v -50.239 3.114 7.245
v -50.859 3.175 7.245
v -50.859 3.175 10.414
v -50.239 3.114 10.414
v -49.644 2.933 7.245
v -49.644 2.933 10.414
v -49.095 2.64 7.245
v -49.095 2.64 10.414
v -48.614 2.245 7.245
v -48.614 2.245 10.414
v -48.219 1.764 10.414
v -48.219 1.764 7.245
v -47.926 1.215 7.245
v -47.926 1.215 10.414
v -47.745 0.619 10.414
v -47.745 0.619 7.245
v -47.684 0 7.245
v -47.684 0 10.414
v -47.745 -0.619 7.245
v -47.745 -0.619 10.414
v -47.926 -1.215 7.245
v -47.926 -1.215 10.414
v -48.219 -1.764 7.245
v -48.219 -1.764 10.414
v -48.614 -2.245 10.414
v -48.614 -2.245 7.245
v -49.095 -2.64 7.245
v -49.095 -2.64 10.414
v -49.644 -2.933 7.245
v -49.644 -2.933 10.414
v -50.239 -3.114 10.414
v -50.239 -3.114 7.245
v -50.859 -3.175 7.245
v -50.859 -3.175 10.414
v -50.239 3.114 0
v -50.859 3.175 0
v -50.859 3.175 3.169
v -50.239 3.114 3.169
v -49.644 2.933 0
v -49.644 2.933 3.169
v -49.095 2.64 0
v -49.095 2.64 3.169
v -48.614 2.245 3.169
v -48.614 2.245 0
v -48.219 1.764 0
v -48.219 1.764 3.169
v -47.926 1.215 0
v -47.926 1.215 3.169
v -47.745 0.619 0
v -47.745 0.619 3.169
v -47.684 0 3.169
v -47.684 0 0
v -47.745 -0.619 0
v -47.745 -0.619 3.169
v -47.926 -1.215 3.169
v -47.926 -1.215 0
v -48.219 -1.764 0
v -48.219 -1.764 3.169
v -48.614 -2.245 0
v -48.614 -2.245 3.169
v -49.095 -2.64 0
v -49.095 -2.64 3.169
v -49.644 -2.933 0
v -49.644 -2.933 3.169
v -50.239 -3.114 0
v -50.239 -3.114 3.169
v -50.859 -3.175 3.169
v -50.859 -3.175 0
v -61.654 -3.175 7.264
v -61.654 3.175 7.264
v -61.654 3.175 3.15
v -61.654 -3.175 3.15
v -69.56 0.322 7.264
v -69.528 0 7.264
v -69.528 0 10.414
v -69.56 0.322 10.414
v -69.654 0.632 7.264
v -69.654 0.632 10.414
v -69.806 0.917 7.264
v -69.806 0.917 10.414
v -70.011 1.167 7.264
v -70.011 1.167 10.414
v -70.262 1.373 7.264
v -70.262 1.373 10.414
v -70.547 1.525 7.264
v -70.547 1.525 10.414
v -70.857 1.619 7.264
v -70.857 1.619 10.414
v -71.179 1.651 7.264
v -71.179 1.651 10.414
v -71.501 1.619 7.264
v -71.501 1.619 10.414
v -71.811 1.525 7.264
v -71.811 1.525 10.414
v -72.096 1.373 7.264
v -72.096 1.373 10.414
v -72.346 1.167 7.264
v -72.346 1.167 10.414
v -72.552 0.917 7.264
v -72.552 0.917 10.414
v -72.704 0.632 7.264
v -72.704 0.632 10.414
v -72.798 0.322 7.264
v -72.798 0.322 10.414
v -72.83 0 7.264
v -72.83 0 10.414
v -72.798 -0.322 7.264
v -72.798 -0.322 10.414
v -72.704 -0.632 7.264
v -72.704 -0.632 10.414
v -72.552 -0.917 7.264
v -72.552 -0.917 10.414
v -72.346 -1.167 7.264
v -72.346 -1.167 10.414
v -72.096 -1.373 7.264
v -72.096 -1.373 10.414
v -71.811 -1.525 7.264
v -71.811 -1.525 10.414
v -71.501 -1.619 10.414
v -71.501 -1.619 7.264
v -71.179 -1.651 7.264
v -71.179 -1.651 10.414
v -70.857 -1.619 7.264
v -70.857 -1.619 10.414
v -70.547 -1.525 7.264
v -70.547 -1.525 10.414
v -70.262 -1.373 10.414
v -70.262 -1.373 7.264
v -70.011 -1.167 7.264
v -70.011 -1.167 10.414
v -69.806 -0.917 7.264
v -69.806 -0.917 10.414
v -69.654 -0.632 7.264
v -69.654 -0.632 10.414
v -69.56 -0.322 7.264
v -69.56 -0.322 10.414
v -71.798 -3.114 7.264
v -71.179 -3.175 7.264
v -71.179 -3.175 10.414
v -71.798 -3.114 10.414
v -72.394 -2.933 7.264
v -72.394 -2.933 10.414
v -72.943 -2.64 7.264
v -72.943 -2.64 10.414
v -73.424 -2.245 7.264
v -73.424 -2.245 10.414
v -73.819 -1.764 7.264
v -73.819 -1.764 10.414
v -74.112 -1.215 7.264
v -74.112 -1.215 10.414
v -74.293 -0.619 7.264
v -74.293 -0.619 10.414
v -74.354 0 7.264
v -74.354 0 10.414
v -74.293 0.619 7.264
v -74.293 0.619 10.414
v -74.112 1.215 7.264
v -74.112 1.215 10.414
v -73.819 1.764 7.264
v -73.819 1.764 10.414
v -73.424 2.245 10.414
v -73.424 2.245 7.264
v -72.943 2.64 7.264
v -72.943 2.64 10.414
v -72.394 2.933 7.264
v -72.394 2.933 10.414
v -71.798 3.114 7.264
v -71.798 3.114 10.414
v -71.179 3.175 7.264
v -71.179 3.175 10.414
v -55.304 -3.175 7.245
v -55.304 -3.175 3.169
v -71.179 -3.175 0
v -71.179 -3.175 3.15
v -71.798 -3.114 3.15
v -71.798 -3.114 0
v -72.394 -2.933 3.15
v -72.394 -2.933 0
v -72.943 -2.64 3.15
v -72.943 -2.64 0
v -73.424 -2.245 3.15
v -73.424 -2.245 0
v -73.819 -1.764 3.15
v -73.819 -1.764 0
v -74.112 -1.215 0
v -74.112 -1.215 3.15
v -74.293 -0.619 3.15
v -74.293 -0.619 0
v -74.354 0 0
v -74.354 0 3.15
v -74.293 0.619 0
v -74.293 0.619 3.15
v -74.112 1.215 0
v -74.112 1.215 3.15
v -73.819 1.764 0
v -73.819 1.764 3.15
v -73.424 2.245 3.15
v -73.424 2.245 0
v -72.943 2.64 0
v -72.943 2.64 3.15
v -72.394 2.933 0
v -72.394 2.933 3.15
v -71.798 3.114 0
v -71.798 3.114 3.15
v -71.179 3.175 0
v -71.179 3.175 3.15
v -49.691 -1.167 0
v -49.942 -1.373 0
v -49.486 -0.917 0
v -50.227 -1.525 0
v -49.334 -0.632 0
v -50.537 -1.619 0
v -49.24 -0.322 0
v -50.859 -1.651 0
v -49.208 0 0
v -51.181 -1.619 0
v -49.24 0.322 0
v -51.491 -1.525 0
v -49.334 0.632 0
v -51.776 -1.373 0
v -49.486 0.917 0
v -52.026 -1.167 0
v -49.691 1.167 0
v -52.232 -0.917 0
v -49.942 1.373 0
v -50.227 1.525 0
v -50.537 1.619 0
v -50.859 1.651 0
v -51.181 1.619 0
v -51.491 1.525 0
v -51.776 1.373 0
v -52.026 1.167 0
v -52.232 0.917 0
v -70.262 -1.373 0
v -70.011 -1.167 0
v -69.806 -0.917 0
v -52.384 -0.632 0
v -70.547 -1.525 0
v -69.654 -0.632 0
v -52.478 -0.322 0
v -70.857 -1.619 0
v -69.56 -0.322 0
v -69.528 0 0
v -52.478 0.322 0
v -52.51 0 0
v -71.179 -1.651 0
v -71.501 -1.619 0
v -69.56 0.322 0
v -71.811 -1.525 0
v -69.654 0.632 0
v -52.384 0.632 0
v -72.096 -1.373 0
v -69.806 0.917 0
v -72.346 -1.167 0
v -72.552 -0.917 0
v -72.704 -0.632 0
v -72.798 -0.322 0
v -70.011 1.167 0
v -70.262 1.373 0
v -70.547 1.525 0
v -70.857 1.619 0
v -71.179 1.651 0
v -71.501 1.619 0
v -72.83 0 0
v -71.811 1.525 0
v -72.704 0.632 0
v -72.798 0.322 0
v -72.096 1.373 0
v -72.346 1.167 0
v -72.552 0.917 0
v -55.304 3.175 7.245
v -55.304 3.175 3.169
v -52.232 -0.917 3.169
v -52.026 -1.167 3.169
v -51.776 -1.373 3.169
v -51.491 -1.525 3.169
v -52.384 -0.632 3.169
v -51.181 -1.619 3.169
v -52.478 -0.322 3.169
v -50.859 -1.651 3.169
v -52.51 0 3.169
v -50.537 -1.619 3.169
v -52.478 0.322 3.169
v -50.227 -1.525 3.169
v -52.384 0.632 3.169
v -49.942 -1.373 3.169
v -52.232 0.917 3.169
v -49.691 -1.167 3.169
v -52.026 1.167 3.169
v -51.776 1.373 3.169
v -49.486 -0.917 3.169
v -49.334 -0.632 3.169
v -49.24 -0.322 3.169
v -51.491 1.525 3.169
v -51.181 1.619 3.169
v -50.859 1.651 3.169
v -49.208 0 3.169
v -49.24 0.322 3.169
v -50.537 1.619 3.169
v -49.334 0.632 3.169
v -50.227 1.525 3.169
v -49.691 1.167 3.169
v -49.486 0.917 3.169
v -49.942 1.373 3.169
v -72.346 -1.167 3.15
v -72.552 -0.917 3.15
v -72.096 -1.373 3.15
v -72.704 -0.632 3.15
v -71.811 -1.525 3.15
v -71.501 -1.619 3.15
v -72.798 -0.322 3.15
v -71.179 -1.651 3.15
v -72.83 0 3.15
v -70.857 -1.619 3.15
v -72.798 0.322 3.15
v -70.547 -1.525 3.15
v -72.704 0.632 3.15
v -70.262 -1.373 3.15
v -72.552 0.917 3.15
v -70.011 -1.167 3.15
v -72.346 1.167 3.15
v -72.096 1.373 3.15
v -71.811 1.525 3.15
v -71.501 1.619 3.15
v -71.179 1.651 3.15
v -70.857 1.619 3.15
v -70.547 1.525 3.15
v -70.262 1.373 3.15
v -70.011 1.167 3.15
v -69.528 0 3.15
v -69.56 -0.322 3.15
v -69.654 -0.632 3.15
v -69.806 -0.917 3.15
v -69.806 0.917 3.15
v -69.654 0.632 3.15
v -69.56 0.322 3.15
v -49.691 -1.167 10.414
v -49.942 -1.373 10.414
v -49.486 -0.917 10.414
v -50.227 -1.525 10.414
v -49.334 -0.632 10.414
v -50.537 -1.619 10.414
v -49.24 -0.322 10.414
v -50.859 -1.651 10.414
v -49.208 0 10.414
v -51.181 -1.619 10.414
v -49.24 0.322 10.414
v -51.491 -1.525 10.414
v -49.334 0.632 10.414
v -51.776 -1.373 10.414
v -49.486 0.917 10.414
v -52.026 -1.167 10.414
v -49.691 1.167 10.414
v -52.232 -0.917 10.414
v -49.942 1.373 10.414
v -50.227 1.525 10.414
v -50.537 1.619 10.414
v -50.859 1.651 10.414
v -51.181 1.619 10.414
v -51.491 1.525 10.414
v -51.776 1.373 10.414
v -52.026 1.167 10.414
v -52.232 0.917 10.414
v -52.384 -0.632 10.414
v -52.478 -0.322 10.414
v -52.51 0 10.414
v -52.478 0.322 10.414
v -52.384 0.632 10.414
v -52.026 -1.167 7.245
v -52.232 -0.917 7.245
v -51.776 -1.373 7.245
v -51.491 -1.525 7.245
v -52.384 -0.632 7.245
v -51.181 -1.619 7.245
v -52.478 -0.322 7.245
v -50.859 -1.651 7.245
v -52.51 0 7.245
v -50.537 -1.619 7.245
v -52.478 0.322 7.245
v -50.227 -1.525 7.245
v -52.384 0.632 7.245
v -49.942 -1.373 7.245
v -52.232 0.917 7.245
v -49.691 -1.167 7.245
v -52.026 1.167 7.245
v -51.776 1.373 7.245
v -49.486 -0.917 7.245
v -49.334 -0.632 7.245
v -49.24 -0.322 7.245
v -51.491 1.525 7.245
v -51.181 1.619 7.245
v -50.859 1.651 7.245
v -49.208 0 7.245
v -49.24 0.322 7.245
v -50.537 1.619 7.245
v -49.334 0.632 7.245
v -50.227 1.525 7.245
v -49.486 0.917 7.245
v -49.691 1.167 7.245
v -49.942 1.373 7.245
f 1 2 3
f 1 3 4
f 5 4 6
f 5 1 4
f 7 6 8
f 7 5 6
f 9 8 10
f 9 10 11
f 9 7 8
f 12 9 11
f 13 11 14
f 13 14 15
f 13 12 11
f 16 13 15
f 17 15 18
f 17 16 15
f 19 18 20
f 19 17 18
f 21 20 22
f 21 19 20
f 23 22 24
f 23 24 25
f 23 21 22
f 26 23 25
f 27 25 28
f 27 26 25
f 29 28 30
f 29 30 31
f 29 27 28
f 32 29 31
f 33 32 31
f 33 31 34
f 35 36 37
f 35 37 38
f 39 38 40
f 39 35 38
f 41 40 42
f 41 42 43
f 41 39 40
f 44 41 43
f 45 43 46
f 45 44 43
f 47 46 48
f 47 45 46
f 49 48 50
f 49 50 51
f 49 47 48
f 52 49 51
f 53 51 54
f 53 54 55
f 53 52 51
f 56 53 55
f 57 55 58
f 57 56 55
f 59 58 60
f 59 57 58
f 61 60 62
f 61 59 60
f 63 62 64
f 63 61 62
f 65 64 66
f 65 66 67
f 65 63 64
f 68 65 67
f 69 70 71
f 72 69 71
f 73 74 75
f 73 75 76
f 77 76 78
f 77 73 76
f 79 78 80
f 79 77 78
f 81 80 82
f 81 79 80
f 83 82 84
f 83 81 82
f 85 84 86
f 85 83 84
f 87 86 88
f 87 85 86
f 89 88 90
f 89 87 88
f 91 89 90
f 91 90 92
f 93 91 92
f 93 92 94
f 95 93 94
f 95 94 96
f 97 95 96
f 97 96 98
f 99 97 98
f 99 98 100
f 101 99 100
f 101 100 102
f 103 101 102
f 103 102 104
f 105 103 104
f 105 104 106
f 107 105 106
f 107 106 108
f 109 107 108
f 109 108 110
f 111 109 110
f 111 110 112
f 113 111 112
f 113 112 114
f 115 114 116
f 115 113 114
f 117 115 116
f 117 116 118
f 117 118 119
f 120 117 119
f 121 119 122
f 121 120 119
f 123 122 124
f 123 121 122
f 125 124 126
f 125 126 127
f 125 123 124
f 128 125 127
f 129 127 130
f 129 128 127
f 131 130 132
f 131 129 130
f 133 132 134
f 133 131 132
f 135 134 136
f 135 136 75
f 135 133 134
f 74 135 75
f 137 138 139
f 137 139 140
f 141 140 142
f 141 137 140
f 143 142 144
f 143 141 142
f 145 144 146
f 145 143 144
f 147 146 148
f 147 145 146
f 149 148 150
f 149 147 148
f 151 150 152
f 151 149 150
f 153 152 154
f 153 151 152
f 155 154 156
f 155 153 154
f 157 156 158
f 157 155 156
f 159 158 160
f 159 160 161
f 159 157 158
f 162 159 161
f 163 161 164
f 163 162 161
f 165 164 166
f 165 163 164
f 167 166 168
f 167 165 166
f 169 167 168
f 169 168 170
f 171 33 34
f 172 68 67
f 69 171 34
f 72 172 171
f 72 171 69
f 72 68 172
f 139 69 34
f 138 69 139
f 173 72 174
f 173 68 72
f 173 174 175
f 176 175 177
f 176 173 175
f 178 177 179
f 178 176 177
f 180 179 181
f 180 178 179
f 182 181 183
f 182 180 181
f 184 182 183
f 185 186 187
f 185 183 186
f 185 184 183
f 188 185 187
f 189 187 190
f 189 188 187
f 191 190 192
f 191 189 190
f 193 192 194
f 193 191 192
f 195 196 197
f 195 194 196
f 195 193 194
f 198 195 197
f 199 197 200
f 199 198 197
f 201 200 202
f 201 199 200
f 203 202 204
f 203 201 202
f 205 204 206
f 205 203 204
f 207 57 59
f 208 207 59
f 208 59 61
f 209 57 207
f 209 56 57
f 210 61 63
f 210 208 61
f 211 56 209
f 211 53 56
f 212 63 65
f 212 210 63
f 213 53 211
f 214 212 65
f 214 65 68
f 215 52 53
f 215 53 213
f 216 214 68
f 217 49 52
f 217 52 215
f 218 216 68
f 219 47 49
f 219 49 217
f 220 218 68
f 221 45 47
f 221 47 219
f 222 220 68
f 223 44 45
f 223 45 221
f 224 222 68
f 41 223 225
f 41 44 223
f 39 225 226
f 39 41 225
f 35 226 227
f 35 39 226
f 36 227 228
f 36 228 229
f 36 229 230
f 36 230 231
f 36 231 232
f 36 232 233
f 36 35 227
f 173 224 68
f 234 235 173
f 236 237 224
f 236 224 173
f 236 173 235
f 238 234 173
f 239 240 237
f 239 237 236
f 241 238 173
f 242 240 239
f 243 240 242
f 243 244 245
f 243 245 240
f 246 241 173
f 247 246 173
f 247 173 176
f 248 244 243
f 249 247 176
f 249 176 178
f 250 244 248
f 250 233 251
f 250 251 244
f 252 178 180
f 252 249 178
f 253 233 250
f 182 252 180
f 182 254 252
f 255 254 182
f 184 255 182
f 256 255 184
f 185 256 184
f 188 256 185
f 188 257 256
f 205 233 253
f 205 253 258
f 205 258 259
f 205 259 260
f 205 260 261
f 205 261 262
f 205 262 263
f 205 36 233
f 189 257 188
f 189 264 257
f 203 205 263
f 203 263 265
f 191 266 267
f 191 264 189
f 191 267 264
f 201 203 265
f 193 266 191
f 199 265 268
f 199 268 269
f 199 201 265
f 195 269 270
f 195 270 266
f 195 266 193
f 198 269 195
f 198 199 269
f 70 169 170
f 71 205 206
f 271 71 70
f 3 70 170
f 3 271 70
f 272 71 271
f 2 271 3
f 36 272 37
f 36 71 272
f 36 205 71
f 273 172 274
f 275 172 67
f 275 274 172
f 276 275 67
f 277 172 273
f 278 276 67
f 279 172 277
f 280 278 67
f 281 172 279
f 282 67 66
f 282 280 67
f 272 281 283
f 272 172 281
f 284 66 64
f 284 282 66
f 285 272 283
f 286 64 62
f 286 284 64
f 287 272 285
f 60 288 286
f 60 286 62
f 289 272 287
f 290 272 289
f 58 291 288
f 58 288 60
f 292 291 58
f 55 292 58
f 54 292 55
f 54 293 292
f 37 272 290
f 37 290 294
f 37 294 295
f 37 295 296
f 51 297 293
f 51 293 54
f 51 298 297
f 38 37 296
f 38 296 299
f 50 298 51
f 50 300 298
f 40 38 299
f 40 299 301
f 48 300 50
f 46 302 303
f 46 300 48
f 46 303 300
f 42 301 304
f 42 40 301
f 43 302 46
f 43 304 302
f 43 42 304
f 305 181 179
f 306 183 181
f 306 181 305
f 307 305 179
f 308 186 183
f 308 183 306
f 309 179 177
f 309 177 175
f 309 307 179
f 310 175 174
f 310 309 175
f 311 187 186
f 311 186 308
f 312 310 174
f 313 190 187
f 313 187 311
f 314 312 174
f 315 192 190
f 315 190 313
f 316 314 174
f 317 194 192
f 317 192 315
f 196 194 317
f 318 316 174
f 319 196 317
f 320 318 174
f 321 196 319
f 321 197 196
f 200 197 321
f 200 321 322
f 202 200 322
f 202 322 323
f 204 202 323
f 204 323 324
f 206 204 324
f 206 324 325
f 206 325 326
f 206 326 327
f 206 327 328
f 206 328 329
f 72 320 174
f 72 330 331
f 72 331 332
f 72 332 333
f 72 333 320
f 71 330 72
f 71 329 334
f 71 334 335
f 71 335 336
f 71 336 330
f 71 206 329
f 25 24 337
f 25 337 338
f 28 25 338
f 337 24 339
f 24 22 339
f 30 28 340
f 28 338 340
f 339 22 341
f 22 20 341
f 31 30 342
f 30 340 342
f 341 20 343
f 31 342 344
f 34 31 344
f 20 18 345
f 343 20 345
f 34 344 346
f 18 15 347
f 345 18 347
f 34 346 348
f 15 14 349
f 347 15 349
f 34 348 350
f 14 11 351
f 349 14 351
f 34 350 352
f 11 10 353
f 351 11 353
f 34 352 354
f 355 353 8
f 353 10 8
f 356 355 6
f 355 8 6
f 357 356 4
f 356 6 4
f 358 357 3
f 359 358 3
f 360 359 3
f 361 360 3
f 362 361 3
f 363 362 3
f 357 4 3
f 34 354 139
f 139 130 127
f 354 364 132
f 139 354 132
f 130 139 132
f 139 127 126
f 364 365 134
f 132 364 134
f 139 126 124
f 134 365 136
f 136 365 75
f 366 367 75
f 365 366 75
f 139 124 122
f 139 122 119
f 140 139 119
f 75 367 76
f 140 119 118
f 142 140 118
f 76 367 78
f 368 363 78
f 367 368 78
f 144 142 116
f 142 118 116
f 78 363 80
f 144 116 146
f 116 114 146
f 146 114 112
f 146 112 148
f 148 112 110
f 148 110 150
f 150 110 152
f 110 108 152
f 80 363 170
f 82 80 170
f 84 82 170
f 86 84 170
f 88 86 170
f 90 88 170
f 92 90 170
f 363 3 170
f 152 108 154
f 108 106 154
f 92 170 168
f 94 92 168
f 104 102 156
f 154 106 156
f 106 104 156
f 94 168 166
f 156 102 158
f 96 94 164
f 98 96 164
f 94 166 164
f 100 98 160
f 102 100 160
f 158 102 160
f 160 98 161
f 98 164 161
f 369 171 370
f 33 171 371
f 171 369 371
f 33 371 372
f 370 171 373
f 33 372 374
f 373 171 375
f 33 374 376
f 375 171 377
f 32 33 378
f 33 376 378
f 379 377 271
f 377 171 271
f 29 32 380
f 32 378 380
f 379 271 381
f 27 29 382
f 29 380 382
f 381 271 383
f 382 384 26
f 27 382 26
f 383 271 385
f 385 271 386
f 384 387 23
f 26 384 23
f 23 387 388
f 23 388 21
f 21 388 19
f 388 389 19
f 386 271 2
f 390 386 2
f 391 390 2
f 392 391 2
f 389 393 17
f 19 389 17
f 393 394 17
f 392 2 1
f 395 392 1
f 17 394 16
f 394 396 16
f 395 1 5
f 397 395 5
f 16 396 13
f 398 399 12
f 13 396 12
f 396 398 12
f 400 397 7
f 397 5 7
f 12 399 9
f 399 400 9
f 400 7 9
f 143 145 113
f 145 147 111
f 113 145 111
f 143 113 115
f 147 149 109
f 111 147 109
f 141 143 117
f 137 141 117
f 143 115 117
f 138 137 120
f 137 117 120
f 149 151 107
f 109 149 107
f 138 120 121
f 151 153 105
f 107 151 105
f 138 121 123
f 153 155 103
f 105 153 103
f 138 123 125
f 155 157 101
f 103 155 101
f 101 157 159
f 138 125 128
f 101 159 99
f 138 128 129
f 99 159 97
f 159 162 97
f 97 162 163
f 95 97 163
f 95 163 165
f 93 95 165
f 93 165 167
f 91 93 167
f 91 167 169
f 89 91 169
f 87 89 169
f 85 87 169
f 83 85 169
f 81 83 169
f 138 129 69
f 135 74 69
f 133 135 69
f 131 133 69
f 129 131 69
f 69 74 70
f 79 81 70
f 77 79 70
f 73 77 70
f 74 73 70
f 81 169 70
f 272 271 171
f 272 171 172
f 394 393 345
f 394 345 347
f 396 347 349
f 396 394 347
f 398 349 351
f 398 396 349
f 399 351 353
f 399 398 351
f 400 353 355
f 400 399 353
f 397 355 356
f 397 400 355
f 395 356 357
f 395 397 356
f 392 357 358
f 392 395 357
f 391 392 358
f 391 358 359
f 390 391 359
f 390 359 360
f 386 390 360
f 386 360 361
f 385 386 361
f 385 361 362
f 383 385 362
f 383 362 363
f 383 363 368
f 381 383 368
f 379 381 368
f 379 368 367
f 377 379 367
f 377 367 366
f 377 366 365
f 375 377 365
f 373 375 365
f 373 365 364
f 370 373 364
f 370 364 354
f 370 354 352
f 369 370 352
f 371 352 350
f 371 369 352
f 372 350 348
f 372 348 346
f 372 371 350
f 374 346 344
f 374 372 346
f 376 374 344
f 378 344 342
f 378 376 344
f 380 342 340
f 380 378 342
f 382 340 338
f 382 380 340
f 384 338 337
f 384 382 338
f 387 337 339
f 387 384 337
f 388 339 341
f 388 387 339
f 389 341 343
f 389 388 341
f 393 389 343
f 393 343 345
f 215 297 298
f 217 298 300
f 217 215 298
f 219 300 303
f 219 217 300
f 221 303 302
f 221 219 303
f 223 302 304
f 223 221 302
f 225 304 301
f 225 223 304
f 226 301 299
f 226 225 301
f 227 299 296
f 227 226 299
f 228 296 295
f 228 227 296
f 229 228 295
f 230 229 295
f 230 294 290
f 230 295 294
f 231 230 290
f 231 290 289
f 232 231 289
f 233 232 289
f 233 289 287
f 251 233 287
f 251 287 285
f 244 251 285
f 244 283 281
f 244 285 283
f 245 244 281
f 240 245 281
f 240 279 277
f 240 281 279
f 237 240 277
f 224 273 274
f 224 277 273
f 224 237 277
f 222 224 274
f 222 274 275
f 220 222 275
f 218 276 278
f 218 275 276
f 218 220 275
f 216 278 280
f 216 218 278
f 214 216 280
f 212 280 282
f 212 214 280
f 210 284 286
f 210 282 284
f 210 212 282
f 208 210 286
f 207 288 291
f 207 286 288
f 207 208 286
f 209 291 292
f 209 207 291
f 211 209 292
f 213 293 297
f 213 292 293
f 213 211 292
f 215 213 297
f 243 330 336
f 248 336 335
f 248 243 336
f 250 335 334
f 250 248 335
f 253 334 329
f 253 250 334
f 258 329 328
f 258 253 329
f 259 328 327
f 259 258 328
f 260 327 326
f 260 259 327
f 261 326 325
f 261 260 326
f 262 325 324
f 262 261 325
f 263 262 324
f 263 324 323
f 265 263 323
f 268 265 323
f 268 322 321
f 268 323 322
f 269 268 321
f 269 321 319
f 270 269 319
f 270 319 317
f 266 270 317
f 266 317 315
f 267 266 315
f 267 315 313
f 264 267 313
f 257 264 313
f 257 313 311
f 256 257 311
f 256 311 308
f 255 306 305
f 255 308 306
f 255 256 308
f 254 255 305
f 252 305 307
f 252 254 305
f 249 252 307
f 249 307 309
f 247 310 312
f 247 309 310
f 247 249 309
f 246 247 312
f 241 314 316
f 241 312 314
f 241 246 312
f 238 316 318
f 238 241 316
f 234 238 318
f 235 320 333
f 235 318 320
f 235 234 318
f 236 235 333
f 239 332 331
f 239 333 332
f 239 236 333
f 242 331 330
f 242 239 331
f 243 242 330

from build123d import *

# Parameters (mm, degrees)
SKETCH1_R           = 1.651
BOSS_EXTRUDE1_DEPTH = 10.414
SKETCH2_W           = 12.7
SKETCH2_H           = 4.1148
SKETCH2_H_2         = 4.0767
CUT_EXTRUDE1_DEPTH  = 7.35


with BuildPart() as part:
    # Sketch1 → Boss-Extrude1 (new body)
    with BuildSketch(Plane.XY):
        with BuildLine():
            Line((-71.178896696, 3.175), (-50.858896696, 3.175))
            ThreePointArc((-50.858896696, 3.175), (-47.683896696, 0), (-50.858896696, -3.175))
            Line((-50.858896696, -3.175), (-71.178896696, -3.175))
            ThreePointArc((-71.178896696, -3.175), (-74.353896696, 0), (-71.178896696, 3.175))
        make_face()
        with Locations((-50.858896696, 0)):
            Circle(SKETCH1_R, mode=Mode.SUBTRACT)
        with Locations((-71.178896696, 0)):
            Circle(SKETCH1_R, mode=Mode.SUBTRACT)
    extrude(amount=BOSS_EXTRUDE1_DEPTH)

    # Sketch2 → Cut-Extrude1 (cut, through all)
    with BuildSketch(Plane(origin=(0, 3.175, 0), x_dir=(1, 0, 0), z_dir=(0, 1, 0))):
        with Locations((-68.003896696, -5.207)):
            Rectangle(SKETCH2_W, SKETCH2_H)
        with Locations((-48.953896696, -5.207)):
            Rectangle(SKETCH2_W, SKETCH2_H_2)
    extrude(amount=-CUT_EXTRUDE1_DEPTH, mode=Mode.SUBTRACT)


solid = part.part
